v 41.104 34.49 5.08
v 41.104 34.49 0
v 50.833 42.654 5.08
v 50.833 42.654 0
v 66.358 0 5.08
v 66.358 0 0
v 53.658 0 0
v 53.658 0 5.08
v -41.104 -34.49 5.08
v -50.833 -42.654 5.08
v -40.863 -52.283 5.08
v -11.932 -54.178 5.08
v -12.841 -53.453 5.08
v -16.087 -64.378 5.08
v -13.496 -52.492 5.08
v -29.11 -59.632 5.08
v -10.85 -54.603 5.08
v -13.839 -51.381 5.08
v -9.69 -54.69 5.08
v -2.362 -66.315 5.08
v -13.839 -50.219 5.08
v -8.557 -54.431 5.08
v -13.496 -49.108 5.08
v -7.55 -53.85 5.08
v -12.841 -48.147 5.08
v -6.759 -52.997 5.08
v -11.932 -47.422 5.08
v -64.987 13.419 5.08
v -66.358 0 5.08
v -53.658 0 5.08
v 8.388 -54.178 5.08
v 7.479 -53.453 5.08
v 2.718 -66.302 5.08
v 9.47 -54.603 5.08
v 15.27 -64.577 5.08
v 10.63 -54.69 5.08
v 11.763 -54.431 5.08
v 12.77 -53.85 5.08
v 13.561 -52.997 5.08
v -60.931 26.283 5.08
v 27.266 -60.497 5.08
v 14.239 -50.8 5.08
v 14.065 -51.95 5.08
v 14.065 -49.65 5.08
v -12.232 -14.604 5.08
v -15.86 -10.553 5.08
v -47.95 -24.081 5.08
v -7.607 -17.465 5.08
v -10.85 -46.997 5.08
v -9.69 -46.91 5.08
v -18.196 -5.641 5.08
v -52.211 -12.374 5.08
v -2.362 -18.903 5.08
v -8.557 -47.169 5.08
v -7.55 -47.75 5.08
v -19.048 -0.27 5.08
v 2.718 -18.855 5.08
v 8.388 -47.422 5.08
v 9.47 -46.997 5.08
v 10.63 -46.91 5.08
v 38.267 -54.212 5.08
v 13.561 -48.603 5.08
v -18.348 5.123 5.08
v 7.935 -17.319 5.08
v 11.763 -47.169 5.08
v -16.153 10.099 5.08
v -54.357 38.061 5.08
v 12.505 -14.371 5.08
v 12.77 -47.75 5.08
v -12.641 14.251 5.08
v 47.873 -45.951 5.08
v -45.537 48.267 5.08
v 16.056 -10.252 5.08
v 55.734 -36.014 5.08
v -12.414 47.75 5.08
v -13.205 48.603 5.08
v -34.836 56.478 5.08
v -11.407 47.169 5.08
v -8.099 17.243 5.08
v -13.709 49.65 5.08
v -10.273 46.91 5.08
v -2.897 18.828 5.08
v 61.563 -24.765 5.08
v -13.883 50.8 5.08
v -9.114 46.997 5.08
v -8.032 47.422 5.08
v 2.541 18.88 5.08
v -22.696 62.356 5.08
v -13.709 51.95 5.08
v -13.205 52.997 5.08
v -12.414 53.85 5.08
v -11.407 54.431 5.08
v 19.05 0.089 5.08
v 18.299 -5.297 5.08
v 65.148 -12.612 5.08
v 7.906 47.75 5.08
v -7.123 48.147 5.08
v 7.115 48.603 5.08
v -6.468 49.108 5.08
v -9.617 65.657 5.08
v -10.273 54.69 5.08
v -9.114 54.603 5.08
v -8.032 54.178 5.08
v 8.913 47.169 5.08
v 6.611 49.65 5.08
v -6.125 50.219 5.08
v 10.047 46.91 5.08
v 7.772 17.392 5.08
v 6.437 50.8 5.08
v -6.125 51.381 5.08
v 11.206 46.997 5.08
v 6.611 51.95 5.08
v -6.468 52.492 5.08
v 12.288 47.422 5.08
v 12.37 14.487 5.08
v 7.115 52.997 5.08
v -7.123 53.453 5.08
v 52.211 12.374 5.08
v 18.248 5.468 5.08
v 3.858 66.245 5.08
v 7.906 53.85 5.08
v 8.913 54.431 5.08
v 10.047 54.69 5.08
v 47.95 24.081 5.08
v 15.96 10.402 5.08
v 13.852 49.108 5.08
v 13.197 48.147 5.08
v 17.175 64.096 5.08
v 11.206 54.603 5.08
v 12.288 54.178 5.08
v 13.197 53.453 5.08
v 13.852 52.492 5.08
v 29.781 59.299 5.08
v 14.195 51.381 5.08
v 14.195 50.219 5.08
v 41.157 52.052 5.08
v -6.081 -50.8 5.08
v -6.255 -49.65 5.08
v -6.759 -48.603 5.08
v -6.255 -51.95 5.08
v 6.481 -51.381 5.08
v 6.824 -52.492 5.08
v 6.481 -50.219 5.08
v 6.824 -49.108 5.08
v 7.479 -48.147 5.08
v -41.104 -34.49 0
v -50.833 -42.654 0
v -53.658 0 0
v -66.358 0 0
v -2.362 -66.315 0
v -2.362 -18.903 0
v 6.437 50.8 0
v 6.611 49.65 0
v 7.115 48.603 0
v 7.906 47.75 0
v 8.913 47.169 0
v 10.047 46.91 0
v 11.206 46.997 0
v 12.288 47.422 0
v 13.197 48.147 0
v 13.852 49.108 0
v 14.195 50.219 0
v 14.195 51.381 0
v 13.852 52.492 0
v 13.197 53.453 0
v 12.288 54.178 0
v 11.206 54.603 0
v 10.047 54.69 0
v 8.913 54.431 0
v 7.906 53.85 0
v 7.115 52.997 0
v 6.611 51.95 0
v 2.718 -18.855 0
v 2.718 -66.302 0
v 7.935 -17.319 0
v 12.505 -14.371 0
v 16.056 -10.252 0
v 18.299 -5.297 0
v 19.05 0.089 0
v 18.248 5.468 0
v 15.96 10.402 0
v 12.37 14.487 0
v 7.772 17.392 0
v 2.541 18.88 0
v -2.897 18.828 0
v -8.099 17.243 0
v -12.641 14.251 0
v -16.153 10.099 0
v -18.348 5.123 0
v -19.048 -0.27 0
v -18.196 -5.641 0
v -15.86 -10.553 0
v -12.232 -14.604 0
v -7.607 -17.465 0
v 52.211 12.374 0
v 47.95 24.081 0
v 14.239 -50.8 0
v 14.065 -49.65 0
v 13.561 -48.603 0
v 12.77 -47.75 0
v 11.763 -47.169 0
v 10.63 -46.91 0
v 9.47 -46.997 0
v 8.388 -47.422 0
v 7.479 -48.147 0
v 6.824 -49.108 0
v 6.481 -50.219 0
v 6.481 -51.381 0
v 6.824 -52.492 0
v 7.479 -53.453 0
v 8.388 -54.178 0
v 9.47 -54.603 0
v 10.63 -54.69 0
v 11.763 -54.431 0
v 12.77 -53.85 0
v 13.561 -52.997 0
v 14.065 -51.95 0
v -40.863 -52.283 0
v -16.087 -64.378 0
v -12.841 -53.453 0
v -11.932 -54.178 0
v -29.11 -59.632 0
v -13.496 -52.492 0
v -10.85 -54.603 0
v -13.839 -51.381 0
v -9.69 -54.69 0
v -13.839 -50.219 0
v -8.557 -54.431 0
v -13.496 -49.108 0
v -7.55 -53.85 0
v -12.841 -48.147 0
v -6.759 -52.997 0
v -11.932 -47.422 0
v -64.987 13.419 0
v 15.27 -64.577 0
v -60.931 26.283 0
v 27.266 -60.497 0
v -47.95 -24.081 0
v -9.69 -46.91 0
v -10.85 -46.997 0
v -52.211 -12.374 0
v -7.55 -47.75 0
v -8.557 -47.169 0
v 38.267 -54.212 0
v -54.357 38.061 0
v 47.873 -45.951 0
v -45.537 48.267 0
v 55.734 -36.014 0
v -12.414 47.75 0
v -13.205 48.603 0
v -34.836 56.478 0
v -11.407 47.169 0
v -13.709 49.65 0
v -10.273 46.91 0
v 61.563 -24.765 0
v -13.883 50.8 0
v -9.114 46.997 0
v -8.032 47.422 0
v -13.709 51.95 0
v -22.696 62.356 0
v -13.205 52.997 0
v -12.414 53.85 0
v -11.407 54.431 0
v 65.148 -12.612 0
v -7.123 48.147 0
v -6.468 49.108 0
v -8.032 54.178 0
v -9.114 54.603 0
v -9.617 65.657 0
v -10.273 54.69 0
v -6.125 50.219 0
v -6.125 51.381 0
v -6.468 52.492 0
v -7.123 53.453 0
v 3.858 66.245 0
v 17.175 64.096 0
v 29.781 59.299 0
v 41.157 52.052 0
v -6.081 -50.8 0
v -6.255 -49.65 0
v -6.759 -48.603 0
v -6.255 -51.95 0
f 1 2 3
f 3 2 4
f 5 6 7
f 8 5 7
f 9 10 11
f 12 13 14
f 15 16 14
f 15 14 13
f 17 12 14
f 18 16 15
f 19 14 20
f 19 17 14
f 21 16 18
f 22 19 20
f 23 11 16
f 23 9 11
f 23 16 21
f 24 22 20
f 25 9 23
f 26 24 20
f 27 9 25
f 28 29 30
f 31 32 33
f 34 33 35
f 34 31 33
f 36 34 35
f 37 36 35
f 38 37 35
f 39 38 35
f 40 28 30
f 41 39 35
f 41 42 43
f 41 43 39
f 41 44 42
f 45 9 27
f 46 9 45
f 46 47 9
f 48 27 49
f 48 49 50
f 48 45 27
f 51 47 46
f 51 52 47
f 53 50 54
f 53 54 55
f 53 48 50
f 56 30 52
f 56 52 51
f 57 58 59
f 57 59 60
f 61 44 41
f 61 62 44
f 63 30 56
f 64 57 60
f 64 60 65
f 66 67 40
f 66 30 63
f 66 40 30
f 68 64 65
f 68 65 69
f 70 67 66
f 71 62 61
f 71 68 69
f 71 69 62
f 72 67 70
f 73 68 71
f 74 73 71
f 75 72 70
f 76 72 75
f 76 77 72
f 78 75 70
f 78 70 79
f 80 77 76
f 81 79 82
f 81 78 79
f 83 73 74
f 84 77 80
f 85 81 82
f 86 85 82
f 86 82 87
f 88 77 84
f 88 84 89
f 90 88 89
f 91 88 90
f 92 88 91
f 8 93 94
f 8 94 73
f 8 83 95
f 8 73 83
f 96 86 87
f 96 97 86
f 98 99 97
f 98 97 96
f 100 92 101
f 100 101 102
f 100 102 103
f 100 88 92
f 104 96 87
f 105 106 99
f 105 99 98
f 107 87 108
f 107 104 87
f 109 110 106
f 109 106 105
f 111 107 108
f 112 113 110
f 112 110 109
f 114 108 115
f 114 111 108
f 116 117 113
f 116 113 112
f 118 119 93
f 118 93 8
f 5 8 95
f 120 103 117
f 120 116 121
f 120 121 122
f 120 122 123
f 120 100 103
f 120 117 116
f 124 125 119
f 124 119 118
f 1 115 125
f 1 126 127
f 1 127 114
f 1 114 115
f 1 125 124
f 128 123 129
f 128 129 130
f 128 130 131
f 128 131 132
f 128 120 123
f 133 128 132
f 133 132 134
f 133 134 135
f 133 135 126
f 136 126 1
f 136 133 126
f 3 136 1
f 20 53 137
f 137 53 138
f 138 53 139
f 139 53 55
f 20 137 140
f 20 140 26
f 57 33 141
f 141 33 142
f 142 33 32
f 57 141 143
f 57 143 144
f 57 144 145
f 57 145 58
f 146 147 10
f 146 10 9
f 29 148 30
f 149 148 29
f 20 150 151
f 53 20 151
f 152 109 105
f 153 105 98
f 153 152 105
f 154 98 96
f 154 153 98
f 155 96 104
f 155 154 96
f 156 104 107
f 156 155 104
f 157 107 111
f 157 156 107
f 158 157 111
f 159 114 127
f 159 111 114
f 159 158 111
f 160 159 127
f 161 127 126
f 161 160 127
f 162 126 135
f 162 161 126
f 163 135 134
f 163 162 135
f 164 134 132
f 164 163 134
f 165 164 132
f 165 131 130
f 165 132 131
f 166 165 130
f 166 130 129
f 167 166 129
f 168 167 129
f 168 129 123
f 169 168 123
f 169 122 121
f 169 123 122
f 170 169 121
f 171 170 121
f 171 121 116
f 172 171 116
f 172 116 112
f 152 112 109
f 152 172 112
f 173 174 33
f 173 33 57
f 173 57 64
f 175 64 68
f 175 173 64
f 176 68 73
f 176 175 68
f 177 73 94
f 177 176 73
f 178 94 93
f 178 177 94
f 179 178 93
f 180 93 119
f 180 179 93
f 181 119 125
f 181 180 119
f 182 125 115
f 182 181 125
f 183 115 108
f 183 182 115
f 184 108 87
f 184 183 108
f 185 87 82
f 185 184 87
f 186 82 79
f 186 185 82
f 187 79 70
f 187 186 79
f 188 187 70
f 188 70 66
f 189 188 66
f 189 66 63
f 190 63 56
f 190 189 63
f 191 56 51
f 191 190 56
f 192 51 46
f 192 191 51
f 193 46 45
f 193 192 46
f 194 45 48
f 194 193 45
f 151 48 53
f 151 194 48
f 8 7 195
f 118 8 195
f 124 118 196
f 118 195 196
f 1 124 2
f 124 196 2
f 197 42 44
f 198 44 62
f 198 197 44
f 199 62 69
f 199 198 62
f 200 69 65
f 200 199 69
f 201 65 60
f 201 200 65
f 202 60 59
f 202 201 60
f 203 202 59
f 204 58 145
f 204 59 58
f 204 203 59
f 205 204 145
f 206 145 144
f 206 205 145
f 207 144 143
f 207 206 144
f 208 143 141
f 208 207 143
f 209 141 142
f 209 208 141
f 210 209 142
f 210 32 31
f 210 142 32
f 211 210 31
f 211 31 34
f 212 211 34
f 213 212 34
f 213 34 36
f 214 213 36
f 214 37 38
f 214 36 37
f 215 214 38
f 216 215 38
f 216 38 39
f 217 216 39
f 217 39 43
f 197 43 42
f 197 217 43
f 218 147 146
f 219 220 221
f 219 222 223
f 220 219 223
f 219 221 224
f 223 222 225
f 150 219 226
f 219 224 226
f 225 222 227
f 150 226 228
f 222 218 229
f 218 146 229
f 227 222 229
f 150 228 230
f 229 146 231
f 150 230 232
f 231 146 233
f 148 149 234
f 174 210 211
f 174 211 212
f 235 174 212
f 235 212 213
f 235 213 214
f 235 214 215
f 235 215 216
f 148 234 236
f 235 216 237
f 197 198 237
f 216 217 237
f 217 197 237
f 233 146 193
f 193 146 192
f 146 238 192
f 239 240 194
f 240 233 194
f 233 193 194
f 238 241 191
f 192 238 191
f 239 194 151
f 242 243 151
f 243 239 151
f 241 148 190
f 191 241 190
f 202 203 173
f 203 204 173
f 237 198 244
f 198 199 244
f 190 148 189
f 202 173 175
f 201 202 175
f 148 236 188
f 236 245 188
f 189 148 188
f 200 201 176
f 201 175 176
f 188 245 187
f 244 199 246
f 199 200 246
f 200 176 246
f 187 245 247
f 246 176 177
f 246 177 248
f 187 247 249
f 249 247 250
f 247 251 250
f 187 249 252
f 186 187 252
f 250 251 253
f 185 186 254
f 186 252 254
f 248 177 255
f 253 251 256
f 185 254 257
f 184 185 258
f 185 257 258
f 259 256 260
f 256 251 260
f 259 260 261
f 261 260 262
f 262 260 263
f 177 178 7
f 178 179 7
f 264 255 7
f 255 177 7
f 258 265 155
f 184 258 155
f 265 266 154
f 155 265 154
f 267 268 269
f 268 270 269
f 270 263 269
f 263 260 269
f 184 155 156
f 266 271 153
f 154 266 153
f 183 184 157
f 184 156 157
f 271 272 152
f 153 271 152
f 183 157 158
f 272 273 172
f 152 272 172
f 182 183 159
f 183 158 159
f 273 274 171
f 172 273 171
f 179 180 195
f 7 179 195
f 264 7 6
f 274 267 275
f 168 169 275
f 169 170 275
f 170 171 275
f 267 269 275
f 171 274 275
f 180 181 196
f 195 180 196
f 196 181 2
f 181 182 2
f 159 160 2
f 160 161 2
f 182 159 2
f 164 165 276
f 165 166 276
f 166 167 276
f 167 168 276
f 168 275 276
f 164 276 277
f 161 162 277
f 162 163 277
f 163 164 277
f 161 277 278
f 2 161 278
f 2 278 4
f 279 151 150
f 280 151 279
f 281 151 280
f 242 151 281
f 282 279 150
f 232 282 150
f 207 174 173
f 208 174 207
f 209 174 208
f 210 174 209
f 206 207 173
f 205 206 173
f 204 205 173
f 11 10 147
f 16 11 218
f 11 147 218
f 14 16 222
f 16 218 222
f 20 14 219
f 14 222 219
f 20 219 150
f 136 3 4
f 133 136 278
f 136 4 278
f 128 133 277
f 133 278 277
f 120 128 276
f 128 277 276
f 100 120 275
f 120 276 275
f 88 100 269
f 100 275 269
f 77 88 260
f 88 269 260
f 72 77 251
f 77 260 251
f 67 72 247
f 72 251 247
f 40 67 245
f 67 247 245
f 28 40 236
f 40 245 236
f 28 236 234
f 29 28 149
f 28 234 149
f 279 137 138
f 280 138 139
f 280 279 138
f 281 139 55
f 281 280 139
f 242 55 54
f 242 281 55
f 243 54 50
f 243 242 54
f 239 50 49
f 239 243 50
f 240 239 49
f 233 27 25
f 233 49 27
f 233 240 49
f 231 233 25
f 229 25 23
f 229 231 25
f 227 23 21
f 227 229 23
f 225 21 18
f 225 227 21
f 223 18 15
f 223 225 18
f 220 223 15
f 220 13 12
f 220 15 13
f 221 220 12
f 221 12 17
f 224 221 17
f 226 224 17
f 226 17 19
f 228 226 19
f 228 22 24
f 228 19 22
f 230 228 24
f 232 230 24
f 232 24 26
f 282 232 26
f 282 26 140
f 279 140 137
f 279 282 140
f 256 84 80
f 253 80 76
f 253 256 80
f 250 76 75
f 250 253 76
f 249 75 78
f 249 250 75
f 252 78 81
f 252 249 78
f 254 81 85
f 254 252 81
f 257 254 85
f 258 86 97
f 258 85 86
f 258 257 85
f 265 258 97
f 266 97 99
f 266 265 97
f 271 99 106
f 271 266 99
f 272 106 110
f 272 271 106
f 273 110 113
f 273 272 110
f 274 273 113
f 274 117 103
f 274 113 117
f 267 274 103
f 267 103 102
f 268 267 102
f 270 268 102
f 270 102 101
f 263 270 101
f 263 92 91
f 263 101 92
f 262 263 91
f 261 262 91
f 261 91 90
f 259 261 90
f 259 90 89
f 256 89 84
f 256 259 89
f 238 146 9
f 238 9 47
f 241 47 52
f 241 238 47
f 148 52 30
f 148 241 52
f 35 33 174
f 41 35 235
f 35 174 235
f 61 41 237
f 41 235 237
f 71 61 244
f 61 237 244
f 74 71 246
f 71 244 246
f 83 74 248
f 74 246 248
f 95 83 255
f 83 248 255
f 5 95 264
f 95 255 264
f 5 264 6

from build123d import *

# Parameters (mm, degrees)
SKETCH1_R           = 66.3575
BOSS_EXTRUDE1_DEPTH = 5.08
CUT_EXTRUDE1_REACH  = 95.981
SKETCH3_R           = 19.05
CUT_EXTRUDE2_REACH  = 95.981
SKETCH3_4_W         = 5.08
SKETCH3_4_H         = 59.193573399
SKETCH3_4_R         = 3.900616975


with BuildPart() as part:
    # Sketch1 → Boss-Extrude1 (new body)
    with BuildSketch(Plane.XY):
        Circle(SKETCH1_R)
    extrude(amount=BOSS_EXTRUDE1_DEPTH)

    # Sketch3 → Cut-Extrude1 (cut, up to next)
    with BuildSketch(Plane.XY, mode=Mode.PRIVATE) as cut_extrude1_sk1:
        Circle(SKETCH3_R)
    cut_extrude1_tool1 = extrude(cut_extrude1_sk1.sketch, amount=CUT_EXTRUDE1_REACH, mode=Mode.PRIVATE) & part.part
    add(cut_extrude1_tool1.solids().sort_by_distance((0, 0, 0))[0], mode=Mode.SUBTRACT)

    # Sketch3<4> → Cut-Extrude2 (cut, up to next)
    with BuildSketch(Plane.XY, mode=Mode.PRIVATE) as cut_extrude2_sk1:
        with Locations((0.17807752, -38.26186151)):
            Rectangle(SKETCH3_4_W, SKETCH3_4_H)
    cut_extrude2_tool1 = extrude(cut_extrude2_sk1.sketch, amount=CUT_EXTRUDE2_REACH, mode=Mode.PRIVATE) & part.part
    # Sketch3<4> → Cut-Extrude2 (cut, up to next)
    with BuildSketch(Plane.XY, mode=Mode.PRIVATE) as cut_extrude2_sk2:
        with Locations((10.33807752, -50.8)):
            Circle(SKETCH3_4_R)
    cut_extrude2_tool2 = extrude(cut_extrude2_sk2.sketch, amount=CUT_EXTRUDE2_REACH, mode=Mode.PRIVATE) & part.part
    # Sketch3<4> → Cut-Extrude2 (cut, up to next)
    with BuildSketch(Plane.XY, mode=Mode.PRIVATE) as cut_extrude2_sk3:
        with Locations((-9.98192248, -50.8)):
            Circle(SKETCH3_4_R)
    cut_extrude2_tool3 = extrude(cut_extrude2_sk3.sketch, amount=CUT_EXTRUDE2_REACH, mode=Mode.PRIVATE) & part.part
    # Sketch3<4> → Cut-Extrude2 (cut, up to next)
    with BuildSketch(Plane.XY, mode=Mode.PRIVATE) as cut_extrude2_sk4:
        with BuildLine():
            ThreePointArc((41.104029707, 34.490376167), (50.4215568, 18.35194584), (53.6575, 0))
            Line((53.6575, 0), (66.3575, 0))
            ThreePointArc((66.3575, 0), (62.355653084, 22.695601661), (50.832794134, 42.65377881))
            Line((50.832794134, 42.65377881), (41.104029707, 34.490376167))
        make_face()
    cut_extrude2_tool4 = extrude(cut_extrude2_sk4.sketch, amount=CUT_EXTRUDE2_REACH, mode=Mode.PRIVATE) & part.part
    # Sketch3<4> → Cut-Extrude2 (cut, up to next)
    with BuildSketch(Plane.XY, mode=Mode.PRIVATE) as cut_extrude2_sk5:
        with BuildLine():
            Line((-50.832794134, -42.65377881), (-41.104029707, -34.490376167))
            ThreePointArc((-41.104029707, -34.490376167), (-50.4215568, -18.35194584), (-53.6575, 0))
            Line((-53.6575, 0), (-66.3575, 0))
            ThreePointArc((-66.3575, 0), (-62.355653084, -22.695601661), (-50.832794134, -42.65377881))
        make_face()
    cut_extrude2_tool5 = extrude(cut_extrude2_sk5.sketch, amount=CUT_EXTRUDE2_REACH, mode=Mode.PRIVATE) & part.part
    # Sketch3<4> → Cut-Extrude2 (cut, up to next)
    with BuildSketch(Plane.XY, mode=Mode.PRIVATE) as cut_extrude2_sk6:
        with Locations((10.33807752, 50.8)):
            Circle(SKETCH3_4_R)
    cut_extrude2_tool6 = extrude(cut_extrude2_sk6.sketch, amount=CUT_EXTRUDE2_REACH, mode=Mode.PRIVATE) & part.part
    # Sketch3<4> → Cut-Extrude2 (cut, up to next)
    with BuildSketch(Plane.XY, mode=Mode.PRIVATE) as cut_extrude2_sk7:
        with Locations((-9.98192248, 50.8)):
            Circle(SKETCH3_4_R)
    cut_extrude2_tool7 = extrude(cut_extrude2_sk7.sketch, amount=CUT_EXTRUDE2_REACH, mode=Mode.PRIVATE) & part.part
    add(cut_extrude2_tool1.solids().sort_by_distance((0.178078, -38.261862, 0))[0], mode=Mode.SUBTRACT)
    add(cut_extrude2_tool2.solids().sort_by_distance((10.338078, -50.8, 0))[0], mode=Mode.SUBTRACT)
    add(cut_extrude2_tool3.solids().sort_by_distance((-9.981922, -50.8, 0))[0], mode=Mode.SUBTRACT)
    add(cut_extrude2_tool4.solids().sort_by_distance((55.456661, 20.184574, 0))[0], mode=Mode.SUBTRACT)
    add(cut_extrude2_tool5.solids().sort_by_distance((-55.456661, -20.184574, 0))[0], mode=Mode.SUBTRACT)
    add(cut_extrude2_tool6.solids().sort_by_distance((10.338078, 50.8, 0))[0], mode=Mode.SUBTRACT)
    add(cut_extrude2_tool7.solids().sort_by_distance((-9.981922, 50.8, 0))[0], mode=Mode.SUBTRACT)


solid = part.part
